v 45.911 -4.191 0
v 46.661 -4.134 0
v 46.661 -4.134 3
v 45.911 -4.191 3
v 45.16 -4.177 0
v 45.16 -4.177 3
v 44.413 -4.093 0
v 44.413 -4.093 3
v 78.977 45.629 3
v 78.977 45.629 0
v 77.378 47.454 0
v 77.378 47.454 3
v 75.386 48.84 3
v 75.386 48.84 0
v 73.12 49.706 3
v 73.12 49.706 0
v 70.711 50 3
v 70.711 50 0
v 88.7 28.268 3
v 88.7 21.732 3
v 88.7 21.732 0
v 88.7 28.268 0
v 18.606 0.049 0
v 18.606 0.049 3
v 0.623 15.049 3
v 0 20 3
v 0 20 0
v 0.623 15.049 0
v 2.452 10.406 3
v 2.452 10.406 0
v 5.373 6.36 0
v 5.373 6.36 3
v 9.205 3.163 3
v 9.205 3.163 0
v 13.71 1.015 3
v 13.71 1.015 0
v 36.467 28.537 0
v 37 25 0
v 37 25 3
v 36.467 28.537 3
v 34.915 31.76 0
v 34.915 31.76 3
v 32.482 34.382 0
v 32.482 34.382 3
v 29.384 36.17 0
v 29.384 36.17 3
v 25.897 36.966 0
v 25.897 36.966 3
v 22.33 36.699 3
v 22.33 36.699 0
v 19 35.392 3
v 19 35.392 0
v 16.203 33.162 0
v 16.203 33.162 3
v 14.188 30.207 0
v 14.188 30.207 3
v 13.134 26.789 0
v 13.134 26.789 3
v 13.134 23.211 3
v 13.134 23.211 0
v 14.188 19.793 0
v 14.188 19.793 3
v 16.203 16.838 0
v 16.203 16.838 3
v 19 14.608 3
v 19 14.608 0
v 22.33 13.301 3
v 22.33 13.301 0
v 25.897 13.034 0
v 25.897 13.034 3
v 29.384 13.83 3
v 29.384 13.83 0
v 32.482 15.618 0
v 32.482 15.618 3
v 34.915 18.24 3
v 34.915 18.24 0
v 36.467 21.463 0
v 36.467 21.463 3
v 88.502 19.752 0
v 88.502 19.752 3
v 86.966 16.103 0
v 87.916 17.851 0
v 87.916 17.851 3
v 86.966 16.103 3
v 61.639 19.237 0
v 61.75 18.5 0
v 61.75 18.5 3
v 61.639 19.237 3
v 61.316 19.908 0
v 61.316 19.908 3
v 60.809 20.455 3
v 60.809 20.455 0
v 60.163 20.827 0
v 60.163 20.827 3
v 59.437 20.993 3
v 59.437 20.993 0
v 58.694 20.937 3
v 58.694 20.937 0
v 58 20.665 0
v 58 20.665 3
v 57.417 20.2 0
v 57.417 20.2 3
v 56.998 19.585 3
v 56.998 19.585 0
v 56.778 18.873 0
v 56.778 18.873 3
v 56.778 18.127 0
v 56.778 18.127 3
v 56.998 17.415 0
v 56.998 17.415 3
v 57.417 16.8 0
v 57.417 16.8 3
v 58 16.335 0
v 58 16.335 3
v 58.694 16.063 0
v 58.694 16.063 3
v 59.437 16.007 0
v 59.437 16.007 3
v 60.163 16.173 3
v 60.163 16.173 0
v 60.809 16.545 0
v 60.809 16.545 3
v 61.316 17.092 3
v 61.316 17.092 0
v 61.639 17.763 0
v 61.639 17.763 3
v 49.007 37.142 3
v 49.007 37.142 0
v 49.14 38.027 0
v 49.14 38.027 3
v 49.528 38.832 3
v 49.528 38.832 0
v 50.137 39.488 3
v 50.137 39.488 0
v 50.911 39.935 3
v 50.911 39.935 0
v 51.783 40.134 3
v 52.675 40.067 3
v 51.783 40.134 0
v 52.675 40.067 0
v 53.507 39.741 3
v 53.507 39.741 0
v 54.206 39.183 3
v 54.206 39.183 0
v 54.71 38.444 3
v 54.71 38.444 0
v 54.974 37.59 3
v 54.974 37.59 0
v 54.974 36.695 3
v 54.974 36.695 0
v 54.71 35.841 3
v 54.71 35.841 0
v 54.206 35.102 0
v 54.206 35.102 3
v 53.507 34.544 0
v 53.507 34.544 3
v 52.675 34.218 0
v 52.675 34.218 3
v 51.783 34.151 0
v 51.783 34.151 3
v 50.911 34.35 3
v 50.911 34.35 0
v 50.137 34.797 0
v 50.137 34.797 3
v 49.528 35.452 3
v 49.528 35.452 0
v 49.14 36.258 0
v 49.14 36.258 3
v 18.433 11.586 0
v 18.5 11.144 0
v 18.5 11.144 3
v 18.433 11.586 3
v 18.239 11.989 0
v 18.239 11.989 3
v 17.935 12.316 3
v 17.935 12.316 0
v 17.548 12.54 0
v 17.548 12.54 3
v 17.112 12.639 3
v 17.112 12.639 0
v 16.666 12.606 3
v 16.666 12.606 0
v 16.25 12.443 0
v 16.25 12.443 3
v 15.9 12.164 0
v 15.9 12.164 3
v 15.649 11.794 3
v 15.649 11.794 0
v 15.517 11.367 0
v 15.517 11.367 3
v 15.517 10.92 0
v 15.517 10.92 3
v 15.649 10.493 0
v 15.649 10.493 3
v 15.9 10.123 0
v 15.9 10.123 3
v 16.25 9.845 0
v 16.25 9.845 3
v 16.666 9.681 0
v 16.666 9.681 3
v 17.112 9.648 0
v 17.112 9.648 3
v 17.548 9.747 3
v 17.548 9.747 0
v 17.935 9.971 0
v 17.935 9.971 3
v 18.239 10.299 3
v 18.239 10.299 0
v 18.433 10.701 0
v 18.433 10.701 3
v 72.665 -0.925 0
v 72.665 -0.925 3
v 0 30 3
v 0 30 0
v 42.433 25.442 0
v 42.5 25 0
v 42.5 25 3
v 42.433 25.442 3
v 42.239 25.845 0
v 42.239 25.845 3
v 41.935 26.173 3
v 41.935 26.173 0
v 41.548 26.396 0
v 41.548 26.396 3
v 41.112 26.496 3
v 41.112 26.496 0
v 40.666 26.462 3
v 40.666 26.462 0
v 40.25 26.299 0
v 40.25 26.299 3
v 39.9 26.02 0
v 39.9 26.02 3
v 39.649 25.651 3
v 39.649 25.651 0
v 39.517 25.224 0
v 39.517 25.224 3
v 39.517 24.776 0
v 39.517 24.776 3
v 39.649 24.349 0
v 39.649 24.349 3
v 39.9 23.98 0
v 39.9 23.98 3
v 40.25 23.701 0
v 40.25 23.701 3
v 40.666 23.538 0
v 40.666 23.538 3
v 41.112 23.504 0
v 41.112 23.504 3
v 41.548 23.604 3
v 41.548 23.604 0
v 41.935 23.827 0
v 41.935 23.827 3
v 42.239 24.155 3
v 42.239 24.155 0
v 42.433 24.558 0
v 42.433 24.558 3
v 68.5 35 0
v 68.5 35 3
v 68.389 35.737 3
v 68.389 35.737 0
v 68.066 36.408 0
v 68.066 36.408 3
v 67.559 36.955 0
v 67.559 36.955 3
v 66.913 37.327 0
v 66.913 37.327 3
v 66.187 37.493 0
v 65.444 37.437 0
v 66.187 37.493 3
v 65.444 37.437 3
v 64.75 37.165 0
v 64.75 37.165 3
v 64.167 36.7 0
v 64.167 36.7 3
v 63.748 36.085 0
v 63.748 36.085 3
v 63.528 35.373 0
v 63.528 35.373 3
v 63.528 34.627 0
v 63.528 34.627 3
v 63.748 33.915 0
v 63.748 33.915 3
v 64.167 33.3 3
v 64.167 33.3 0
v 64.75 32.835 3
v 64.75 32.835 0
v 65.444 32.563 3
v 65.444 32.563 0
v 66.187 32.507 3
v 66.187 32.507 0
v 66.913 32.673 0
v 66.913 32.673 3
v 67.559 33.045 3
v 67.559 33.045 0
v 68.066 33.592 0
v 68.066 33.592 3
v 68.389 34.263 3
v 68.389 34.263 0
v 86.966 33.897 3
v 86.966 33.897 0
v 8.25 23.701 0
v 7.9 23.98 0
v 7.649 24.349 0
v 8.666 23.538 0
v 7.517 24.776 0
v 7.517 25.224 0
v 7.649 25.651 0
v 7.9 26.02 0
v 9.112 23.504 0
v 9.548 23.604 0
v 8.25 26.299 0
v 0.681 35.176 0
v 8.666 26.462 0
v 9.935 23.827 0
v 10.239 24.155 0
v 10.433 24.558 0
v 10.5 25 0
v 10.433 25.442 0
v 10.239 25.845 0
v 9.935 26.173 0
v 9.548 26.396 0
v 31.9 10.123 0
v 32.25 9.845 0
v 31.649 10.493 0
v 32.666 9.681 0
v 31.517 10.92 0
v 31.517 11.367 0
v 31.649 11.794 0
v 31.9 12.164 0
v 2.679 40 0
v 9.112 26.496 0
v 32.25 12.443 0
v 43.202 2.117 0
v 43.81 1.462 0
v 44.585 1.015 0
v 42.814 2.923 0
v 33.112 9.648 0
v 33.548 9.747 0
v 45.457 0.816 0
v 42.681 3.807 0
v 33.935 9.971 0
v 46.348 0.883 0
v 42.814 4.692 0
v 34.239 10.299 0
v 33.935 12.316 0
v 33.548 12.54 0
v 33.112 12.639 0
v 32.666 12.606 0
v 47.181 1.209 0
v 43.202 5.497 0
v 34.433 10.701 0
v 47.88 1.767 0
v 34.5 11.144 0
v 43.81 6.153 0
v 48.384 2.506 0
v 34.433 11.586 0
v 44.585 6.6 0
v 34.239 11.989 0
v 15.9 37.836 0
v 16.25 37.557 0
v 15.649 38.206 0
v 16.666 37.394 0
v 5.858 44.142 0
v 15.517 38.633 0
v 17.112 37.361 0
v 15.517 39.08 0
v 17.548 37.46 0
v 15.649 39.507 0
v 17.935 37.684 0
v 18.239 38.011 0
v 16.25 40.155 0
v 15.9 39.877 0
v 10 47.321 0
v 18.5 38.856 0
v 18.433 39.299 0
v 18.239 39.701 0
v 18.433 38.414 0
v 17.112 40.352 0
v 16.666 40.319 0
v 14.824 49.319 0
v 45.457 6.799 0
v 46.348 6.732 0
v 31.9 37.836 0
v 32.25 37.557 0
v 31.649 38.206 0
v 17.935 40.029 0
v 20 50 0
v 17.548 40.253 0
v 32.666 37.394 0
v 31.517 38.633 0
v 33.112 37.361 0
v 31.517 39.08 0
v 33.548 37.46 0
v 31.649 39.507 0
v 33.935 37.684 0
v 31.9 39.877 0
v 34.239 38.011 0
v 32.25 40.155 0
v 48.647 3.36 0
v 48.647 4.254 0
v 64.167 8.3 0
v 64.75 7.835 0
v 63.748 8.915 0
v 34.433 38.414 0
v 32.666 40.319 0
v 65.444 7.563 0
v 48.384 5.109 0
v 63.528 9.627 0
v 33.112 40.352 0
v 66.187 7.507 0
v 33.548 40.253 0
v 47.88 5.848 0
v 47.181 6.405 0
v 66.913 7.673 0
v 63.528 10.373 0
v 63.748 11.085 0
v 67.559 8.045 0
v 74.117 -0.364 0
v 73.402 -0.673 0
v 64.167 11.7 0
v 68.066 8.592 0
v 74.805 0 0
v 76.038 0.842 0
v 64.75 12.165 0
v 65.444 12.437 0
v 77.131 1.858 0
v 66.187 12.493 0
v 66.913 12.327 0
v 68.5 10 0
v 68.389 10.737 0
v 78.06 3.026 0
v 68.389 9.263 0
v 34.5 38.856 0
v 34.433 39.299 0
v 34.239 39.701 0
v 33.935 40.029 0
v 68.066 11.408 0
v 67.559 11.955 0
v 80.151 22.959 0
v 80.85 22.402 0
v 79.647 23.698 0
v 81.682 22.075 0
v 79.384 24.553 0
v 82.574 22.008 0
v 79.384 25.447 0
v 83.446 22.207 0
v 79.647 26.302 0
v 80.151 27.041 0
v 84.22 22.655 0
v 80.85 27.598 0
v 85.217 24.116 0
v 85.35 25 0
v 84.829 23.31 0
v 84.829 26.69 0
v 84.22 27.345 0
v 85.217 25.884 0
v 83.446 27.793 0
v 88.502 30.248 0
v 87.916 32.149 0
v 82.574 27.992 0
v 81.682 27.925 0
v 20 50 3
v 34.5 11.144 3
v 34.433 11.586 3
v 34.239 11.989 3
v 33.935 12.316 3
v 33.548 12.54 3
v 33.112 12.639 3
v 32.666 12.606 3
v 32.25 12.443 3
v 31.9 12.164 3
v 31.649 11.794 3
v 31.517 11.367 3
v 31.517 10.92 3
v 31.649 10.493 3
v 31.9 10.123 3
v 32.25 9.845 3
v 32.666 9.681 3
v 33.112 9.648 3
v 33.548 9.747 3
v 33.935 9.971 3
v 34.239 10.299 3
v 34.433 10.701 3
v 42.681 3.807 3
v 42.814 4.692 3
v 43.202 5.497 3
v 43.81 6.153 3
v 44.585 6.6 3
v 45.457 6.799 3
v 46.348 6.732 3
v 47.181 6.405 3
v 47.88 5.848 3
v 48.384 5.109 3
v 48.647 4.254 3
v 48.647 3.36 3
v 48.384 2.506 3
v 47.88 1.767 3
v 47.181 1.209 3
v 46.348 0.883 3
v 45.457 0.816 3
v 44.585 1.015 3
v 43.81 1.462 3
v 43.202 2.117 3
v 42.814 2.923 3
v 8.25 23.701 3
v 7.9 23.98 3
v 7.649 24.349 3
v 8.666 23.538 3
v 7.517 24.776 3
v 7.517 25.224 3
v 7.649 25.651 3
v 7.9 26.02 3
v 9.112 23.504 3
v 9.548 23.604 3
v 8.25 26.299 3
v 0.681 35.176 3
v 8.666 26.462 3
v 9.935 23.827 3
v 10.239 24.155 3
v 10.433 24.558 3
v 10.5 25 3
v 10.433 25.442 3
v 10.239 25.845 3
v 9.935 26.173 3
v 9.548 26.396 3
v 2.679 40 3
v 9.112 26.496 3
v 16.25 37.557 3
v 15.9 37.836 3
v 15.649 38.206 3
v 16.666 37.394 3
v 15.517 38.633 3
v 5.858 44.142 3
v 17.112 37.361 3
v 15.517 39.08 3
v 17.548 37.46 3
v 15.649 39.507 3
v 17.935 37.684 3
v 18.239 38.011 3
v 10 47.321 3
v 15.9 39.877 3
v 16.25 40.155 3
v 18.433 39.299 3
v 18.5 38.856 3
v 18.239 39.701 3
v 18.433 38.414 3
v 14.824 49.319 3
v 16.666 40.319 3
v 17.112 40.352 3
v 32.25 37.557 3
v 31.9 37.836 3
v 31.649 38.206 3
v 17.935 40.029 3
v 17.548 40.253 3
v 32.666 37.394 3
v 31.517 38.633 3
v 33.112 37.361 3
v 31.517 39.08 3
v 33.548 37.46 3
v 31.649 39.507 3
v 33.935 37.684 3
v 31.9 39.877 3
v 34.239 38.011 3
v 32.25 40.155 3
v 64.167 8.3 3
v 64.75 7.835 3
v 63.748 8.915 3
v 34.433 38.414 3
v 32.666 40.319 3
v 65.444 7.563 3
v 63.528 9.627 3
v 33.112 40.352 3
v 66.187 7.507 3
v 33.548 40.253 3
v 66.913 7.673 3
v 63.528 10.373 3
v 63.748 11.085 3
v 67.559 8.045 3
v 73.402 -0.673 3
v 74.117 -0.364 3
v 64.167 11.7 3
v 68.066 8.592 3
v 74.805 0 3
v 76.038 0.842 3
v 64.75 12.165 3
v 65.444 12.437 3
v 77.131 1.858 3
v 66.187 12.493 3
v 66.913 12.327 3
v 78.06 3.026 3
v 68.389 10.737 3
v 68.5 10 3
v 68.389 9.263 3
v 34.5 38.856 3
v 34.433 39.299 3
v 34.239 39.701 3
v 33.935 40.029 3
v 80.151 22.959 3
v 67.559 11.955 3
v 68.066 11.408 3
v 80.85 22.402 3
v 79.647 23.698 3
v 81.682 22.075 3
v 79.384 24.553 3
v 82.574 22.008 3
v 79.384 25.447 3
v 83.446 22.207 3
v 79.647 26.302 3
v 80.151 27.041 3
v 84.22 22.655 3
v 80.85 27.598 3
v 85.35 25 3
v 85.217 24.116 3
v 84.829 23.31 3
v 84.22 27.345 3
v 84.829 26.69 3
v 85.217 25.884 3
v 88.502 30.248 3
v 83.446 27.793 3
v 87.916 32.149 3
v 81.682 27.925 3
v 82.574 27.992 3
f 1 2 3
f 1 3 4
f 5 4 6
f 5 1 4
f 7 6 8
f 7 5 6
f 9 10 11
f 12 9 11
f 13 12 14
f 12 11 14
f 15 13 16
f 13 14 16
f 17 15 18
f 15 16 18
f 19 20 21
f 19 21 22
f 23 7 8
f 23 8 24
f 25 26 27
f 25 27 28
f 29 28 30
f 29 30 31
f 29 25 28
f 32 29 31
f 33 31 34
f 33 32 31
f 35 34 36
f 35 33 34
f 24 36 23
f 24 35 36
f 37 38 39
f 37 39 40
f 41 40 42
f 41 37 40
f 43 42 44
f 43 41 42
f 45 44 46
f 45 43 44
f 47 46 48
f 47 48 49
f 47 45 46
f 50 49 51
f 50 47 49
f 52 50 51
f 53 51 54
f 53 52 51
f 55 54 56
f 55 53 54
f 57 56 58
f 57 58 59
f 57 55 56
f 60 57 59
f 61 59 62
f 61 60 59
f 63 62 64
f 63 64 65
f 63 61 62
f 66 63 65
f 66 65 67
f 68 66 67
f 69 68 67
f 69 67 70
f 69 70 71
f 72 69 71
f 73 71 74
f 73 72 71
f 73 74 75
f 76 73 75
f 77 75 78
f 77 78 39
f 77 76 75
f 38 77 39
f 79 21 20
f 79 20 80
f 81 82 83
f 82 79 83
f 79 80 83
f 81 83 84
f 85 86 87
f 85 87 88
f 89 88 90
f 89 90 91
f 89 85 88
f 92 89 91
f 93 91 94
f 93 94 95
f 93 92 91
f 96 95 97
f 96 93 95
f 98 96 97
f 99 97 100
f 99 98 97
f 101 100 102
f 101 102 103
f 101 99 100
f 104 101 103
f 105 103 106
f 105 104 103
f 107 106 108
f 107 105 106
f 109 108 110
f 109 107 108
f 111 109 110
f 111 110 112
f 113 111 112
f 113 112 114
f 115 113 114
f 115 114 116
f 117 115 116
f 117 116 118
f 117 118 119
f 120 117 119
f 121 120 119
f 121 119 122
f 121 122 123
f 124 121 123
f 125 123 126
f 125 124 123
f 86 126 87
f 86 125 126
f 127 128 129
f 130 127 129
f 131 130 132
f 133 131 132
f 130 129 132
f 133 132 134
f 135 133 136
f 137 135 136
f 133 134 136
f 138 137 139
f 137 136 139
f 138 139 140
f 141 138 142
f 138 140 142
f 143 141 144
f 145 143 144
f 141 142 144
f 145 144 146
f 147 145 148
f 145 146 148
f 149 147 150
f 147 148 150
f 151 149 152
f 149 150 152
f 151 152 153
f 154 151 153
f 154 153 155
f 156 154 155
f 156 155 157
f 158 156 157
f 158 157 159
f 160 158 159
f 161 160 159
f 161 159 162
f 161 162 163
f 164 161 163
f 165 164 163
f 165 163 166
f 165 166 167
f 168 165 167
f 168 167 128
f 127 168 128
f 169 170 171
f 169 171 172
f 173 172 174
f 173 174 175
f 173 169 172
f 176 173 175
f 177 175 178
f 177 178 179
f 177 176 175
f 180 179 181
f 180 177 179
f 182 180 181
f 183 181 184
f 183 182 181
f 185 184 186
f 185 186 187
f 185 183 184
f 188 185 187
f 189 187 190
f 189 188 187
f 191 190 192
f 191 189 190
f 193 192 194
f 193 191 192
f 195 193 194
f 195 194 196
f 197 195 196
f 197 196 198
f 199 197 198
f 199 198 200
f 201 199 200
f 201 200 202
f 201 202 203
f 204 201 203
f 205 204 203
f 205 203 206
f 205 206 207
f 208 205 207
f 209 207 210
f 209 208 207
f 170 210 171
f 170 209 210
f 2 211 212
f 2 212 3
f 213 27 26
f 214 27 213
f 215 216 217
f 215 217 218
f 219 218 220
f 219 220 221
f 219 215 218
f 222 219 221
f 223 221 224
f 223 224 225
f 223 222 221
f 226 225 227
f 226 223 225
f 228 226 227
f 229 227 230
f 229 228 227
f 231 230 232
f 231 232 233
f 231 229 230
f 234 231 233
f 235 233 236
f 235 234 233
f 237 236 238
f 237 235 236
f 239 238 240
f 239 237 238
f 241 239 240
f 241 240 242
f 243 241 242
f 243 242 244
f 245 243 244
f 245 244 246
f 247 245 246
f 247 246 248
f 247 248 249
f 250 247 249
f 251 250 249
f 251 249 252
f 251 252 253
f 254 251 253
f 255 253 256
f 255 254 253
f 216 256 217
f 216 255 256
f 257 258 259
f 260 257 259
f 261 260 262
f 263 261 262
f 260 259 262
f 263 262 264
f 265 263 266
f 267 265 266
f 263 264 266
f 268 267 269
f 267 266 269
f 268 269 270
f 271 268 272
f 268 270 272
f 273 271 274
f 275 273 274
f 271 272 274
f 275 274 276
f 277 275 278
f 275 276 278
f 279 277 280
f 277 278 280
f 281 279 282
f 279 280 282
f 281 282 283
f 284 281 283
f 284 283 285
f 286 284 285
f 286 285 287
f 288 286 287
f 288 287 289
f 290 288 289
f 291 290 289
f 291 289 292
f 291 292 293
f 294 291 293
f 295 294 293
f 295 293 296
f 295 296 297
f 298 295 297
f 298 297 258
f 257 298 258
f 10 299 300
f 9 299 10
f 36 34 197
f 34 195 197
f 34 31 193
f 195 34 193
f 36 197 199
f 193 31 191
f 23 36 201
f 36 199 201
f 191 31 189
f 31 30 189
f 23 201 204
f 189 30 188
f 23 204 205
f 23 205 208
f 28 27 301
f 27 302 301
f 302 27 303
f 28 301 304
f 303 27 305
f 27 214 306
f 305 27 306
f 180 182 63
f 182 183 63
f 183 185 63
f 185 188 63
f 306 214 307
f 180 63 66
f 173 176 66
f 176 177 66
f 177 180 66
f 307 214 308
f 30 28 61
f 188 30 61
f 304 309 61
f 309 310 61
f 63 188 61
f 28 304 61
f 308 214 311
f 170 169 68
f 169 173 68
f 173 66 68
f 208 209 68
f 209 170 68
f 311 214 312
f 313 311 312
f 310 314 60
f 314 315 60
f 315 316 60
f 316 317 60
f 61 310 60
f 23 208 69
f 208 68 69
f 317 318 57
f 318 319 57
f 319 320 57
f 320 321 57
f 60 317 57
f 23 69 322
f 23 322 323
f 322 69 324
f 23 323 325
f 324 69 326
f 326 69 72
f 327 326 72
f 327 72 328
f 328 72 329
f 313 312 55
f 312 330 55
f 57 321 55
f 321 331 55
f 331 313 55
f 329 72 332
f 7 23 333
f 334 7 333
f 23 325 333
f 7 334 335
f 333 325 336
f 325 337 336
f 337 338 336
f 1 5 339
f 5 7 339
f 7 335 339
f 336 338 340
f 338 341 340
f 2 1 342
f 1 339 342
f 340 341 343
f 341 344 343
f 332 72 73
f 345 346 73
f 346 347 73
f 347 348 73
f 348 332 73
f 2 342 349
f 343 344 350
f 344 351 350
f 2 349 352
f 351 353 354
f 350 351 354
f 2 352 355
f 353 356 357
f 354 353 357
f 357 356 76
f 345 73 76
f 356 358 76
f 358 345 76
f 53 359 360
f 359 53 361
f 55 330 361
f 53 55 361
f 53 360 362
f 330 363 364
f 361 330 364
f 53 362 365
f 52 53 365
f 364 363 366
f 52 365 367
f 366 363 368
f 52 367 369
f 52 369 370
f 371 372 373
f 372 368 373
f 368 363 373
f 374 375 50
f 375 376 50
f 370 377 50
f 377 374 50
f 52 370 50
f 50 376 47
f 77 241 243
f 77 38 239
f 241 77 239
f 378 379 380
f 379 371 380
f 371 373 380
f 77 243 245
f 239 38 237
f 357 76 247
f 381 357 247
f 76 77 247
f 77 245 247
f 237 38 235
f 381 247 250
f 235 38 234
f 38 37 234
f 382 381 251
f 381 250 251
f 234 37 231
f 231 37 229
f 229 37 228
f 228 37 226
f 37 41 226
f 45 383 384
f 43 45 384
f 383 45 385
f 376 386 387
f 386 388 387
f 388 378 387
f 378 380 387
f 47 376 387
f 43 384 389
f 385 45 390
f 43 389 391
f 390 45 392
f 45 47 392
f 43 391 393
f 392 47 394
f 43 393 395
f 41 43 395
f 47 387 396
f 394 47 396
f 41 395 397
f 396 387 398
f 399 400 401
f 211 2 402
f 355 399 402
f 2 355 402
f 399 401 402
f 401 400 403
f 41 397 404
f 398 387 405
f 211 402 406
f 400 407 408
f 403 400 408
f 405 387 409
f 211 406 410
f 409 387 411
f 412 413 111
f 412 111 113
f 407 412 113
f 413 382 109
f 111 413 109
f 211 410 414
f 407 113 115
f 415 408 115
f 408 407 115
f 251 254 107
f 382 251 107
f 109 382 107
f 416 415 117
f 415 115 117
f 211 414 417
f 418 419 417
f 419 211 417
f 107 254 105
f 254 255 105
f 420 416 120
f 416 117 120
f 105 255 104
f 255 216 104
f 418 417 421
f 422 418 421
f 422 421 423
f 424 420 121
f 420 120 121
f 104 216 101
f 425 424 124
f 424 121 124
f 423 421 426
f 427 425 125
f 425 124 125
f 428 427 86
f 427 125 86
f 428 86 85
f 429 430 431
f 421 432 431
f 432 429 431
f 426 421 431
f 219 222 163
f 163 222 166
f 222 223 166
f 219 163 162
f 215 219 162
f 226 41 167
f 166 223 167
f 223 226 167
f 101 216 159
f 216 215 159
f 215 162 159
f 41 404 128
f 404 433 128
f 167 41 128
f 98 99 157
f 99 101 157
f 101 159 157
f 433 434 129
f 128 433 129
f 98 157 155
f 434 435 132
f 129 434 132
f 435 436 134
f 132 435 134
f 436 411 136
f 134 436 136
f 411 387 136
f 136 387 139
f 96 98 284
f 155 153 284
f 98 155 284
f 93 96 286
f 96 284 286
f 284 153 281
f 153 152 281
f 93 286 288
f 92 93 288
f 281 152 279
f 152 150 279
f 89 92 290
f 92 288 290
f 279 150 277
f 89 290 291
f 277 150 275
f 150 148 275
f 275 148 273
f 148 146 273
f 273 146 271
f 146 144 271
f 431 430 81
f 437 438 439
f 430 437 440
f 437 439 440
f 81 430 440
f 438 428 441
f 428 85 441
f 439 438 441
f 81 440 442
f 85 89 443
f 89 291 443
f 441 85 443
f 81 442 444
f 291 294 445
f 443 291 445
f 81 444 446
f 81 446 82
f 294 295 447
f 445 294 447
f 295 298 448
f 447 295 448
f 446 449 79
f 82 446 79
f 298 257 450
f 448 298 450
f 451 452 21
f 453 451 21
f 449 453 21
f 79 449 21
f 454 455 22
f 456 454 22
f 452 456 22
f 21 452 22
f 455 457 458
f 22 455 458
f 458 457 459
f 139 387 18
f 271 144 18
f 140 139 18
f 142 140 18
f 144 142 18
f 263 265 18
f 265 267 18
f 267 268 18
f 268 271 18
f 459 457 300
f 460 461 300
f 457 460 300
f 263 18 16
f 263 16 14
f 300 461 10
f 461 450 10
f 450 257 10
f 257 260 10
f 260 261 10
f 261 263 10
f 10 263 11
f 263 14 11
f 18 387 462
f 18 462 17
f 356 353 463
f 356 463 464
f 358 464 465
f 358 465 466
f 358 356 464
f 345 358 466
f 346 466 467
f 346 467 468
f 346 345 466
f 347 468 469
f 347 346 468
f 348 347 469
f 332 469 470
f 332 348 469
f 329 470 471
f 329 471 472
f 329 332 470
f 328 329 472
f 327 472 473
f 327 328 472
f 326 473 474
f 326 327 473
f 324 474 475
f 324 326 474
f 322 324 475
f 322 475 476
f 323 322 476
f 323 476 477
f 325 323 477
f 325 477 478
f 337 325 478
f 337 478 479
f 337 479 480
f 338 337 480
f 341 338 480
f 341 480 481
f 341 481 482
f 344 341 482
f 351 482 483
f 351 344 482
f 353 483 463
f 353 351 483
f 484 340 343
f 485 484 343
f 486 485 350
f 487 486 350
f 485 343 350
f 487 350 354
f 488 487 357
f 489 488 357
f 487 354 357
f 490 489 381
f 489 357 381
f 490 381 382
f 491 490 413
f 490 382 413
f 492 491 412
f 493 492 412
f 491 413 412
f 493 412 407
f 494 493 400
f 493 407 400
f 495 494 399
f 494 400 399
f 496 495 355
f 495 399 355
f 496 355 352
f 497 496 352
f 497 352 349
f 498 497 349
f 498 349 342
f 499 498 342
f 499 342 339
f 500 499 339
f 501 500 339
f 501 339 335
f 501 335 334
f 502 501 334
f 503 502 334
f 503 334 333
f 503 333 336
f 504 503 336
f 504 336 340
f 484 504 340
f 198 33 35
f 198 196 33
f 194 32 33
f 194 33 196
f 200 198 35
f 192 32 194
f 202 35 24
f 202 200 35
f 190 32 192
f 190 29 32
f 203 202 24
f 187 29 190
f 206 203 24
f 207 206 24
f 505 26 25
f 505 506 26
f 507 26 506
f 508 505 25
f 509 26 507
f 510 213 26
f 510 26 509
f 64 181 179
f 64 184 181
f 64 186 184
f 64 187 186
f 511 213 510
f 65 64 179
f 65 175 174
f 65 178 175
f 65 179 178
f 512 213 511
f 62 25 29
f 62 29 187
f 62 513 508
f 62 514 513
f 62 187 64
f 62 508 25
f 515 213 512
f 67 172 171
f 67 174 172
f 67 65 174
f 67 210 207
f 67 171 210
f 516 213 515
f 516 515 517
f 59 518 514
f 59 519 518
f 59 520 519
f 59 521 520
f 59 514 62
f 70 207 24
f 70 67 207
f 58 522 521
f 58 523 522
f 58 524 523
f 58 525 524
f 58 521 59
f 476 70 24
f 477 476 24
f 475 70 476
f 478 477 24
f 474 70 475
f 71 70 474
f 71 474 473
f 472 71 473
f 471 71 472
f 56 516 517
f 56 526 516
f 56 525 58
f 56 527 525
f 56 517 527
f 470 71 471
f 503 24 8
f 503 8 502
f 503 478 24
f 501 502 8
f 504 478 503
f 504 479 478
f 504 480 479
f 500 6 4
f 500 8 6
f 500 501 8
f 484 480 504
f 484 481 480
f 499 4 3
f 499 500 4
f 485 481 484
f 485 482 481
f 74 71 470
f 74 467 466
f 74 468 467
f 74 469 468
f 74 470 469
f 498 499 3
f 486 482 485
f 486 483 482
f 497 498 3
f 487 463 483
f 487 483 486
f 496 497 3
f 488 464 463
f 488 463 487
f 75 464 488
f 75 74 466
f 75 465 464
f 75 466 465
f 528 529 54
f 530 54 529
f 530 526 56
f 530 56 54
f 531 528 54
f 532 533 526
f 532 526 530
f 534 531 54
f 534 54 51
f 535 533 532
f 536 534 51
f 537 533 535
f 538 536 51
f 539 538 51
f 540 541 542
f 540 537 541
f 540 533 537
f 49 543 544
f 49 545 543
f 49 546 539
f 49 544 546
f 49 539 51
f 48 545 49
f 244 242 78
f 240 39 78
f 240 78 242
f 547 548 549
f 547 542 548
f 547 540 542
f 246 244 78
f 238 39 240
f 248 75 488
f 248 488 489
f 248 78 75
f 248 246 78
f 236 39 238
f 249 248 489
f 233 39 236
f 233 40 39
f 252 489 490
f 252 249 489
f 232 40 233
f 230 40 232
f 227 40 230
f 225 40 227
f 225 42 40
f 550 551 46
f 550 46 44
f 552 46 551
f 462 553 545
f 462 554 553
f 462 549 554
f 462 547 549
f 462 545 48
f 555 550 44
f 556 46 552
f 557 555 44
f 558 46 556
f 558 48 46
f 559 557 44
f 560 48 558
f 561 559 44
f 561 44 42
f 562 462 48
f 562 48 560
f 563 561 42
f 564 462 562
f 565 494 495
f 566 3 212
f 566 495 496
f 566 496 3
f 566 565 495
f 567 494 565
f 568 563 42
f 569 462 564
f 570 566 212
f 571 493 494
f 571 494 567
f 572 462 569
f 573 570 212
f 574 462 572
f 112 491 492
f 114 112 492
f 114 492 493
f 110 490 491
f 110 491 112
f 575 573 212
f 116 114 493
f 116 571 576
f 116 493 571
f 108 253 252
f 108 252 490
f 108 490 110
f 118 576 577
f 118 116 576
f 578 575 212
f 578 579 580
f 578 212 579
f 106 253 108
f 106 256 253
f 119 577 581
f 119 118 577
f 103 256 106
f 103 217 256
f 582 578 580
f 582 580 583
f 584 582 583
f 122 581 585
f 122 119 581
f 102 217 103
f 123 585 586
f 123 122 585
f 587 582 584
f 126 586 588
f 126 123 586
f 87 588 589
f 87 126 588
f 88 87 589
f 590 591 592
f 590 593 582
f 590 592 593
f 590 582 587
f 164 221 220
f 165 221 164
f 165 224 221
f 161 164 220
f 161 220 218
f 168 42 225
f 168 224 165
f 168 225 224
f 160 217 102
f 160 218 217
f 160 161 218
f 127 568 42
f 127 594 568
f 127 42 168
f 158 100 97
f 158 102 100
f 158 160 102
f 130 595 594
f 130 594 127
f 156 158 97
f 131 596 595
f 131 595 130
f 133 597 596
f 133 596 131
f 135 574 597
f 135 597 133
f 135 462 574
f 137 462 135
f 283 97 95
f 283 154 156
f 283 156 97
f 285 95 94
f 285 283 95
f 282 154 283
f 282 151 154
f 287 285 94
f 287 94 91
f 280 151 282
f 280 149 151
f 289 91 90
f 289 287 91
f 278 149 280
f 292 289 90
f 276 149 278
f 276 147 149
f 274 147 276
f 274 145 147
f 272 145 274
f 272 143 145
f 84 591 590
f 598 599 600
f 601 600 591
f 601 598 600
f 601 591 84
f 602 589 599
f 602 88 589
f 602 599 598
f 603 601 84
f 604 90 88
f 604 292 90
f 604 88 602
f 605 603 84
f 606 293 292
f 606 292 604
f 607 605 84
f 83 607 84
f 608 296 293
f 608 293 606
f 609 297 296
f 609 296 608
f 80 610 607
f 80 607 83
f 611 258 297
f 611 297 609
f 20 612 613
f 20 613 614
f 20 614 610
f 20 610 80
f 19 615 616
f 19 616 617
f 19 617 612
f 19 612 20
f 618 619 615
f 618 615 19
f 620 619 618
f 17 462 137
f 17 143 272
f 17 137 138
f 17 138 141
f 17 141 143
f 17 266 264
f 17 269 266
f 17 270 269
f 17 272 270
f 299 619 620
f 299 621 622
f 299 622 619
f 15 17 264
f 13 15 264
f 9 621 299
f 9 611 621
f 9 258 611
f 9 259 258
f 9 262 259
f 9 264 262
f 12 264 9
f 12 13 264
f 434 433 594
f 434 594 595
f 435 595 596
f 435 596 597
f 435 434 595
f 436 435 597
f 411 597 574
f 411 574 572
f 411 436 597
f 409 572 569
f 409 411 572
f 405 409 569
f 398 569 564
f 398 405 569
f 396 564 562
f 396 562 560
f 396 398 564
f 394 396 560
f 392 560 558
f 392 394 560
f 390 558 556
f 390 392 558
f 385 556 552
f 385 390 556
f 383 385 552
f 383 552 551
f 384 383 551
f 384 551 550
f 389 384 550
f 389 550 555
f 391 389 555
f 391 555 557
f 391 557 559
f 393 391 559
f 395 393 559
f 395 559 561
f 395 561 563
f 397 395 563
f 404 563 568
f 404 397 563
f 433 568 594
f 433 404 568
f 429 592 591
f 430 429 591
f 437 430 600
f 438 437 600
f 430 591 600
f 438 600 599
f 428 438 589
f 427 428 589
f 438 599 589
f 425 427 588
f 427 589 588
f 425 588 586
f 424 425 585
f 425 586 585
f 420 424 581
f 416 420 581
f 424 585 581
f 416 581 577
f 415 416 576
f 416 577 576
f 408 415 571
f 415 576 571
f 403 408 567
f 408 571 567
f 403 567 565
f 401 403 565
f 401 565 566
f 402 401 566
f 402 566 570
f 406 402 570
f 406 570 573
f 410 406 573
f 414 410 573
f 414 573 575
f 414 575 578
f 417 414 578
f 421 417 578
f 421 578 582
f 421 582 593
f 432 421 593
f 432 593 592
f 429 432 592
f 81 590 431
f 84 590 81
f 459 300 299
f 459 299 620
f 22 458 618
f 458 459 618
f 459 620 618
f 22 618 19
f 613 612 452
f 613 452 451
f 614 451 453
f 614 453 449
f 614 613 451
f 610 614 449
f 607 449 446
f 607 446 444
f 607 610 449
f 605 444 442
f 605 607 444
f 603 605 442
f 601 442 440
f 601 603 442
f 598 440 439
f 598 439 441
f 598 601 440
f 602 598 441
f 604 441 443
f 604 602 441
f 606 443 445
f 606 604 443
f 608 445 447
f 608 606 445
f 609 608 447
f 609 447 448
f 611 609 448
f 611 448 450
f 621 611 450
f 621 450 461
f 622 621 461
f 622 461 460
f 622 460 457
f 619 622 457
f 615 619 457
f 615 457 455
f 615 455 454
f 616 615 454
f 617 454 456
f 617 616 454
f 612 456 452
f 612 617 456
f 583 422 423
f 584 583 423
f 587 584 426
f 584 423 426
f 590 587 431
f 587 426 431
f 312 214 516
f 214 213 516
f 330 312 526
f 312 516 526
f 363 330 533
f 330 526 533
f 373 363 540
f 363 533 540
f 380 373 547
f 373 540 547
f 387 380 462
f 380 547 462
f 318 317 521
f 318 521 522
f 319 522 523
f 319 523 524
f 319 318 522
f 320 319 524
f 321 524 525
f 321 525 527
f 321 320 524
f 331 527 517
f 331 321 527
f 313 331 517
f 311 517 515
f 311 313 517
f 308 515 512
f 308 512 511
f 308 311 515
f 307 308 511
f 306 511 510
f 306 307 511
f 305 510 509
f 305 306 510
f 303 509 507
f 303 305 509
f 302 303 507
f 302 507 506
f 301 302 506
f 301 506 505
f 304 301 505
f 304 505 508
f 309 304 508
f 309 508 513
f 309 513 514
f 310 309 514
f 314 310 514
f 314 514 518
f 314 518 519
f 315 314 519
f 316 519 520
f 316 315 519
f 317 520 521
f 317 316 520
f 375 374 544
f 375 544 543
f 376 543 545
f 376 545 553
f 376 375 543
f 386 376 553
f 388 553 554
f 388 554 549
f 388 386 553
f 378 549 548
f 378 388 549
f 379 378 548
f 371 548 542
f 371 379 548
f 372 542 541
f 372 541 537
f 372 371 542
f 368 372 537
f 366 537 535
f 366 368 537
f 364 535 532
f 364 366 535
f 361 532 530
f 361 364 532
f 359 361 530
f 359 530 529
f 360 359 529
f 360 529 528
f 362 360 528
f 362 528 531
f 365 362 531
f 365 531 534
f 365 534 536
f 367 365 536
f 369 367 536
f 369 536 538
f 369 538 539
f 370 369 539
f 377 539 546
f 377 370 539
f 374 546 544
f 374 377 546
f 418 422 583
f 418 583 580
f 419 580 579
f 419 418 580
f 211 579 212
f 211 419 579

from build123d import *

# Parameters (mm, degrees)
ESBO_O1_W                = 76
ESBO_O1_H                = 50
ESBO_O1_R                = 2.5
ESBO_O1_R_2              = 12
ESBO_O1_R_3              = 1.5
RESSALTO_EXTRUS_O1_DEPTH = 3
ESBO_O2_R                = 2.5
CORTE_EXTRUS_O1_DEPTH    = 3
FILETE1_R                = 20
ESBO_O3_R                = 2.5
RESSALTO_EXTRUS_O2_DEPTH = 3
ESBO_O5_R                = 3
CORTE_EXTRUS_O2_DEPTH    = 92.021975369
RESSALTO_EXTRUS_O3_DEPTH = 3
RESSALTO_EXTRUS_O4_DEPTH = 3
FILETE2_R                = 10
ESBO_O7_R                = 2.5
CORTE_EXTRUS_O3_DEPTH    = 10


with BuildPart() as part:
    # Esboço1 → Ressalto-extrusão1 (new body)
    with BuildSketch(Plane.XY):
        with Locations((38, 25)):
            Rectangle(ESBO_O1_W, ESBO_O1_H)
        with Locations((59.25, 18.5)):
            Circle(ESBO_O1_R, mode=Mode.SUBTRACT)
        with Locations((25, 25)):
            Circle(ESBO_O1_R_2, mode=Mode.SUBTRACT)
        with Locations((17, 38.856406461)):
            Circle(ESBO_O1_R_3, mode=Mode.SUBTRACT)
        with Locations((33, 38.856406461)):
            Circle(ESBO_O1_R_3, mode=Mode.SUBTRACT)
        with Locations((41, 25)):
            Circle(ESBO_O1_R_3, mode=Mode.SUBTRACT)
        with Locations((33, 11.143593539)):
            Circle(ESBO_O1_R_3, mode=Mode.SUBTRACT)
        with Locations((17, 11.143593539)):
            Circle(ESBO_O1_R_3, mode=Mode.SUBTRACT)
        with Locations((9, 25)):
            Circle(ESBO_O1_R_3, mode=Mode.SUBTRACT)
    extrude(amount=RESSALTO_EXTRUS_O1_DEPTH)

    # Esboço2 → Corte-extrusão1 (cut)
    with BuildSketch(Plane.XY.offset(3)):
        with Locations((66, 35)):
            Circle(ESBO_O2_R)
        with Locations((66, 15)):
            Circle(ESBO_O2_R)
    extrude(amount=-CORTE_EXTRUS_O1_DEPTH, mode=Mode.SUBTRACT)

    # Filete1
    filete1_edges = [part.edges().sort_by_distance(p)[0] for p in [
        (0, 50, 1.5),
        (0, 0, 1.5),
    ]]
    fillet(filete1_edges, radius=FILETE1_R)

    # Esboço3 → Ressalto-extrusão2 (add, through all)
    with BuildSketch(Plane.XY.offset(3)):
        with Locations((66, 15)):
            Circle(ESBO_O3_R)
        with Locations((66, 35)):
            Circle(ESBO_O3_R)
    extrude(amount=-RESSALTO_EXTRUS_O2_DEPTH)

    # Esboço5 → Corte-extrusão2 (cut, through all)
    with BuildSketch(Plane(origin=(0, 0, 0), x_dir=(-1, 0, 0), z_dir=(0, 0, -1))):
        with Locations((-45.680731562, 3.807316308)):
            Circle(ESBO_O5_R)
        with Locations((-52.0071049, 37.142437356)):
            Circle(ESBO_O5_R)
    extrude(amount=-CORTE_EXTRUS_O2_DEPTH, mode=Mode.SUBTRACT)

    # Esboço4 → Ressalto-extrusão3 (add, through all)
    with BuildSketch(Plane(origin=(0, 0, 0), x_dir=(-1, 0, 0), z_dir=(0, 0, -1))):
        with BuildLine():
            ThreePointArc((-18.605557994, 0.048670934), (-19.30235443, 0.012171437), (-20, 0))
            Line((-20, 0), (-74.805369877, 0))
            ThreePointArc((-74.805369877, 0), (-73.762195737, -0.525177263), (-72.66490464, -0.925146879))
            Line((-72.66490464, -0.925146879), (-46.660572258, -4.133783454))
            ThreePointArc((-46.660572258, -4.133783454), (-45.535290053, -4.192683692), (-44.412892385, -4.09292021))
            Line((-44.412892385, -4.09292021), (-18.605557994, 0.048670934))
        make_face()
    extrude(amount=-RESSALTO_EXTRUS_O3_DEPTH)

    # Esboço6 → Ressalto-extrusão4 (add, through all)
    with BuildSketch(Plane.XY.offset(3)):
        with BuildLine():
            Line((88.7, 31.35), (76, 50))
            Line((76, 50), (76, 25))
            Line((76, 25), (79.35, 25))
            ThreePointArc((79.35, 25), (82.35, 28), (85.35, 25))
            Line((85.35, 25), (88.7, 25))
            Line((88.7, 25), (88.7, 31.35))
        make_face()
        with BuildLine():
            Line((79.35, 25), (76, 25))
            Line((76, 25), (76, 0))
            Line((76, 0), (88.7, 18.65))
            Line((88.7, 18.65), (88.7, 25))
            Line((88.7, 25), (85.35, 25))
            ThreePointArc((85.35, 25), (82.35, 22), (79.35, 25))
        make_face()
    extrude(amount=-RESSALTO_EXTRUS_O4_DEPTH)

    # Filete2
    # the kernel refuses this fillet: 10 mm, written as the material it takes off along each edge
    with BuildSketch(Plane(origin=(88.7, 18.65, 10.703782372), x_dir=(-0.5628554049483921, -0.8265553781328759, 0), z_dir=(0, 0, -1)), Plane(origin=(88.7, 31.35, 10.703782372), x_dir=(0, -1, 0), z_dir=(0, 0, -1))) as filete2_piece_1:
        with BuildLine():
            CenterArc((FILETE2_R * 0.308151294884, FILETE2_R), FILETE2_R, 235.746501053, 34.253498947)
            Line((-FILETE2_R * 0.254704110065, FILETE2_R * 0.173444621867), (-FILETE2_R * 0.265961218164, FILETE2_R * 0.156913514304))
            Line((-FILETE2_R * 0.265961218164, FILETE2_R * 0.156913514304), (-FILETE2_R * 0.00616302589767, -FILETE2_R * 0.02))
            Line((-FILETE2_R * 0.00616302589767, -FILETE2_R * 0.02), (FILETE2_R * 0.308151294884, -FILETE2_R * 0.02))
            Line((FILETE2_R * 0.308151294884, -FILETE2_R * 0.02), (FILETE2_R * 0.308151294884, 0))
        make_face()
    extrude(amount=18.407564744, mode=Mode.SUBTRACT)
    with BuildSketch(Plane(origin=(76, 50, -13.221878613), x_dir=(-1, 0, 0), z_dir=(0, 0, 1))) as filete2_piece_2:
        with BuildLine():
            CenterArc((FILETE2_R * 0.528875144505, FILETE2_R), FILETE2_R, 214.253498947, 55.746501053)
            Line((-FILETE2_R * 0.297680233628, FILETE2_R * 0.437144595052), (-FILETE2_R * 0.31421134119, FILETE2_R * 0.425887486953))
            Line((-FILETE2_R * 0.31421134119, FILETE2_R * 0.425887486953), (-FILETE2_R * 0.0105775028901, -FILETE2_R * 0.02))
            Line((-FILETE2_R * 0.0105775028901, -FILETE2_R * 0.02), (FILETE2_R * 0.528875144505, -FILETE2_R * 0.02))
            Line((FILETE2_R * 0.528875144505, -FILETE2_R * 0.02), (FILETE2_R * 0.528875144505, 0))
        make_face()
    extrude(amount=29.443757225, mode=Mode.SUBTRACT)
    with BuildSketch(Plane(origin=(76, 0, -9.151102244), x_dir=(-1, 0, 0), z_dir=(0, 0, 1))) as filete2_piece_3:
        with BuildLine():
            CenterArc((6.205254838, -8.65411116), FILETE2_R, 120.070317479, 25.676183574)
            Line((-2.060298944, -3.02555711), (-2.225610019, -2.912986029))
            Line((-2.225610019, -2.912986029), (-0.165311076, 0.112571081))
            Line((-0.165311076, 0.112571081), (0, 0.2))
            ThreePointArc((0, 0.2), (0.597315061, 0.2), (1.094417628, 0.173082223))
            Line((1.094417628, 0.173082223), (1.194630123, 0))
        make_face()
    extrude(amount=21.302204488, mode=Mode.SUBTRACT)

    # Esboço7 → Corte-extrusão3 (cut)
    with BuildSketch(Plane.XY.offset(3)):
        with Locations((66, 35)):
            Circle(ESBO_O7_R)
        with Locations((66, 10)):
            Circle(ESBO_O7_R)
    extrude(amount=-CORTE_EXTRUS_O3_DEPTH, mode=Mode.SUBTRACT)


solid = part.part
